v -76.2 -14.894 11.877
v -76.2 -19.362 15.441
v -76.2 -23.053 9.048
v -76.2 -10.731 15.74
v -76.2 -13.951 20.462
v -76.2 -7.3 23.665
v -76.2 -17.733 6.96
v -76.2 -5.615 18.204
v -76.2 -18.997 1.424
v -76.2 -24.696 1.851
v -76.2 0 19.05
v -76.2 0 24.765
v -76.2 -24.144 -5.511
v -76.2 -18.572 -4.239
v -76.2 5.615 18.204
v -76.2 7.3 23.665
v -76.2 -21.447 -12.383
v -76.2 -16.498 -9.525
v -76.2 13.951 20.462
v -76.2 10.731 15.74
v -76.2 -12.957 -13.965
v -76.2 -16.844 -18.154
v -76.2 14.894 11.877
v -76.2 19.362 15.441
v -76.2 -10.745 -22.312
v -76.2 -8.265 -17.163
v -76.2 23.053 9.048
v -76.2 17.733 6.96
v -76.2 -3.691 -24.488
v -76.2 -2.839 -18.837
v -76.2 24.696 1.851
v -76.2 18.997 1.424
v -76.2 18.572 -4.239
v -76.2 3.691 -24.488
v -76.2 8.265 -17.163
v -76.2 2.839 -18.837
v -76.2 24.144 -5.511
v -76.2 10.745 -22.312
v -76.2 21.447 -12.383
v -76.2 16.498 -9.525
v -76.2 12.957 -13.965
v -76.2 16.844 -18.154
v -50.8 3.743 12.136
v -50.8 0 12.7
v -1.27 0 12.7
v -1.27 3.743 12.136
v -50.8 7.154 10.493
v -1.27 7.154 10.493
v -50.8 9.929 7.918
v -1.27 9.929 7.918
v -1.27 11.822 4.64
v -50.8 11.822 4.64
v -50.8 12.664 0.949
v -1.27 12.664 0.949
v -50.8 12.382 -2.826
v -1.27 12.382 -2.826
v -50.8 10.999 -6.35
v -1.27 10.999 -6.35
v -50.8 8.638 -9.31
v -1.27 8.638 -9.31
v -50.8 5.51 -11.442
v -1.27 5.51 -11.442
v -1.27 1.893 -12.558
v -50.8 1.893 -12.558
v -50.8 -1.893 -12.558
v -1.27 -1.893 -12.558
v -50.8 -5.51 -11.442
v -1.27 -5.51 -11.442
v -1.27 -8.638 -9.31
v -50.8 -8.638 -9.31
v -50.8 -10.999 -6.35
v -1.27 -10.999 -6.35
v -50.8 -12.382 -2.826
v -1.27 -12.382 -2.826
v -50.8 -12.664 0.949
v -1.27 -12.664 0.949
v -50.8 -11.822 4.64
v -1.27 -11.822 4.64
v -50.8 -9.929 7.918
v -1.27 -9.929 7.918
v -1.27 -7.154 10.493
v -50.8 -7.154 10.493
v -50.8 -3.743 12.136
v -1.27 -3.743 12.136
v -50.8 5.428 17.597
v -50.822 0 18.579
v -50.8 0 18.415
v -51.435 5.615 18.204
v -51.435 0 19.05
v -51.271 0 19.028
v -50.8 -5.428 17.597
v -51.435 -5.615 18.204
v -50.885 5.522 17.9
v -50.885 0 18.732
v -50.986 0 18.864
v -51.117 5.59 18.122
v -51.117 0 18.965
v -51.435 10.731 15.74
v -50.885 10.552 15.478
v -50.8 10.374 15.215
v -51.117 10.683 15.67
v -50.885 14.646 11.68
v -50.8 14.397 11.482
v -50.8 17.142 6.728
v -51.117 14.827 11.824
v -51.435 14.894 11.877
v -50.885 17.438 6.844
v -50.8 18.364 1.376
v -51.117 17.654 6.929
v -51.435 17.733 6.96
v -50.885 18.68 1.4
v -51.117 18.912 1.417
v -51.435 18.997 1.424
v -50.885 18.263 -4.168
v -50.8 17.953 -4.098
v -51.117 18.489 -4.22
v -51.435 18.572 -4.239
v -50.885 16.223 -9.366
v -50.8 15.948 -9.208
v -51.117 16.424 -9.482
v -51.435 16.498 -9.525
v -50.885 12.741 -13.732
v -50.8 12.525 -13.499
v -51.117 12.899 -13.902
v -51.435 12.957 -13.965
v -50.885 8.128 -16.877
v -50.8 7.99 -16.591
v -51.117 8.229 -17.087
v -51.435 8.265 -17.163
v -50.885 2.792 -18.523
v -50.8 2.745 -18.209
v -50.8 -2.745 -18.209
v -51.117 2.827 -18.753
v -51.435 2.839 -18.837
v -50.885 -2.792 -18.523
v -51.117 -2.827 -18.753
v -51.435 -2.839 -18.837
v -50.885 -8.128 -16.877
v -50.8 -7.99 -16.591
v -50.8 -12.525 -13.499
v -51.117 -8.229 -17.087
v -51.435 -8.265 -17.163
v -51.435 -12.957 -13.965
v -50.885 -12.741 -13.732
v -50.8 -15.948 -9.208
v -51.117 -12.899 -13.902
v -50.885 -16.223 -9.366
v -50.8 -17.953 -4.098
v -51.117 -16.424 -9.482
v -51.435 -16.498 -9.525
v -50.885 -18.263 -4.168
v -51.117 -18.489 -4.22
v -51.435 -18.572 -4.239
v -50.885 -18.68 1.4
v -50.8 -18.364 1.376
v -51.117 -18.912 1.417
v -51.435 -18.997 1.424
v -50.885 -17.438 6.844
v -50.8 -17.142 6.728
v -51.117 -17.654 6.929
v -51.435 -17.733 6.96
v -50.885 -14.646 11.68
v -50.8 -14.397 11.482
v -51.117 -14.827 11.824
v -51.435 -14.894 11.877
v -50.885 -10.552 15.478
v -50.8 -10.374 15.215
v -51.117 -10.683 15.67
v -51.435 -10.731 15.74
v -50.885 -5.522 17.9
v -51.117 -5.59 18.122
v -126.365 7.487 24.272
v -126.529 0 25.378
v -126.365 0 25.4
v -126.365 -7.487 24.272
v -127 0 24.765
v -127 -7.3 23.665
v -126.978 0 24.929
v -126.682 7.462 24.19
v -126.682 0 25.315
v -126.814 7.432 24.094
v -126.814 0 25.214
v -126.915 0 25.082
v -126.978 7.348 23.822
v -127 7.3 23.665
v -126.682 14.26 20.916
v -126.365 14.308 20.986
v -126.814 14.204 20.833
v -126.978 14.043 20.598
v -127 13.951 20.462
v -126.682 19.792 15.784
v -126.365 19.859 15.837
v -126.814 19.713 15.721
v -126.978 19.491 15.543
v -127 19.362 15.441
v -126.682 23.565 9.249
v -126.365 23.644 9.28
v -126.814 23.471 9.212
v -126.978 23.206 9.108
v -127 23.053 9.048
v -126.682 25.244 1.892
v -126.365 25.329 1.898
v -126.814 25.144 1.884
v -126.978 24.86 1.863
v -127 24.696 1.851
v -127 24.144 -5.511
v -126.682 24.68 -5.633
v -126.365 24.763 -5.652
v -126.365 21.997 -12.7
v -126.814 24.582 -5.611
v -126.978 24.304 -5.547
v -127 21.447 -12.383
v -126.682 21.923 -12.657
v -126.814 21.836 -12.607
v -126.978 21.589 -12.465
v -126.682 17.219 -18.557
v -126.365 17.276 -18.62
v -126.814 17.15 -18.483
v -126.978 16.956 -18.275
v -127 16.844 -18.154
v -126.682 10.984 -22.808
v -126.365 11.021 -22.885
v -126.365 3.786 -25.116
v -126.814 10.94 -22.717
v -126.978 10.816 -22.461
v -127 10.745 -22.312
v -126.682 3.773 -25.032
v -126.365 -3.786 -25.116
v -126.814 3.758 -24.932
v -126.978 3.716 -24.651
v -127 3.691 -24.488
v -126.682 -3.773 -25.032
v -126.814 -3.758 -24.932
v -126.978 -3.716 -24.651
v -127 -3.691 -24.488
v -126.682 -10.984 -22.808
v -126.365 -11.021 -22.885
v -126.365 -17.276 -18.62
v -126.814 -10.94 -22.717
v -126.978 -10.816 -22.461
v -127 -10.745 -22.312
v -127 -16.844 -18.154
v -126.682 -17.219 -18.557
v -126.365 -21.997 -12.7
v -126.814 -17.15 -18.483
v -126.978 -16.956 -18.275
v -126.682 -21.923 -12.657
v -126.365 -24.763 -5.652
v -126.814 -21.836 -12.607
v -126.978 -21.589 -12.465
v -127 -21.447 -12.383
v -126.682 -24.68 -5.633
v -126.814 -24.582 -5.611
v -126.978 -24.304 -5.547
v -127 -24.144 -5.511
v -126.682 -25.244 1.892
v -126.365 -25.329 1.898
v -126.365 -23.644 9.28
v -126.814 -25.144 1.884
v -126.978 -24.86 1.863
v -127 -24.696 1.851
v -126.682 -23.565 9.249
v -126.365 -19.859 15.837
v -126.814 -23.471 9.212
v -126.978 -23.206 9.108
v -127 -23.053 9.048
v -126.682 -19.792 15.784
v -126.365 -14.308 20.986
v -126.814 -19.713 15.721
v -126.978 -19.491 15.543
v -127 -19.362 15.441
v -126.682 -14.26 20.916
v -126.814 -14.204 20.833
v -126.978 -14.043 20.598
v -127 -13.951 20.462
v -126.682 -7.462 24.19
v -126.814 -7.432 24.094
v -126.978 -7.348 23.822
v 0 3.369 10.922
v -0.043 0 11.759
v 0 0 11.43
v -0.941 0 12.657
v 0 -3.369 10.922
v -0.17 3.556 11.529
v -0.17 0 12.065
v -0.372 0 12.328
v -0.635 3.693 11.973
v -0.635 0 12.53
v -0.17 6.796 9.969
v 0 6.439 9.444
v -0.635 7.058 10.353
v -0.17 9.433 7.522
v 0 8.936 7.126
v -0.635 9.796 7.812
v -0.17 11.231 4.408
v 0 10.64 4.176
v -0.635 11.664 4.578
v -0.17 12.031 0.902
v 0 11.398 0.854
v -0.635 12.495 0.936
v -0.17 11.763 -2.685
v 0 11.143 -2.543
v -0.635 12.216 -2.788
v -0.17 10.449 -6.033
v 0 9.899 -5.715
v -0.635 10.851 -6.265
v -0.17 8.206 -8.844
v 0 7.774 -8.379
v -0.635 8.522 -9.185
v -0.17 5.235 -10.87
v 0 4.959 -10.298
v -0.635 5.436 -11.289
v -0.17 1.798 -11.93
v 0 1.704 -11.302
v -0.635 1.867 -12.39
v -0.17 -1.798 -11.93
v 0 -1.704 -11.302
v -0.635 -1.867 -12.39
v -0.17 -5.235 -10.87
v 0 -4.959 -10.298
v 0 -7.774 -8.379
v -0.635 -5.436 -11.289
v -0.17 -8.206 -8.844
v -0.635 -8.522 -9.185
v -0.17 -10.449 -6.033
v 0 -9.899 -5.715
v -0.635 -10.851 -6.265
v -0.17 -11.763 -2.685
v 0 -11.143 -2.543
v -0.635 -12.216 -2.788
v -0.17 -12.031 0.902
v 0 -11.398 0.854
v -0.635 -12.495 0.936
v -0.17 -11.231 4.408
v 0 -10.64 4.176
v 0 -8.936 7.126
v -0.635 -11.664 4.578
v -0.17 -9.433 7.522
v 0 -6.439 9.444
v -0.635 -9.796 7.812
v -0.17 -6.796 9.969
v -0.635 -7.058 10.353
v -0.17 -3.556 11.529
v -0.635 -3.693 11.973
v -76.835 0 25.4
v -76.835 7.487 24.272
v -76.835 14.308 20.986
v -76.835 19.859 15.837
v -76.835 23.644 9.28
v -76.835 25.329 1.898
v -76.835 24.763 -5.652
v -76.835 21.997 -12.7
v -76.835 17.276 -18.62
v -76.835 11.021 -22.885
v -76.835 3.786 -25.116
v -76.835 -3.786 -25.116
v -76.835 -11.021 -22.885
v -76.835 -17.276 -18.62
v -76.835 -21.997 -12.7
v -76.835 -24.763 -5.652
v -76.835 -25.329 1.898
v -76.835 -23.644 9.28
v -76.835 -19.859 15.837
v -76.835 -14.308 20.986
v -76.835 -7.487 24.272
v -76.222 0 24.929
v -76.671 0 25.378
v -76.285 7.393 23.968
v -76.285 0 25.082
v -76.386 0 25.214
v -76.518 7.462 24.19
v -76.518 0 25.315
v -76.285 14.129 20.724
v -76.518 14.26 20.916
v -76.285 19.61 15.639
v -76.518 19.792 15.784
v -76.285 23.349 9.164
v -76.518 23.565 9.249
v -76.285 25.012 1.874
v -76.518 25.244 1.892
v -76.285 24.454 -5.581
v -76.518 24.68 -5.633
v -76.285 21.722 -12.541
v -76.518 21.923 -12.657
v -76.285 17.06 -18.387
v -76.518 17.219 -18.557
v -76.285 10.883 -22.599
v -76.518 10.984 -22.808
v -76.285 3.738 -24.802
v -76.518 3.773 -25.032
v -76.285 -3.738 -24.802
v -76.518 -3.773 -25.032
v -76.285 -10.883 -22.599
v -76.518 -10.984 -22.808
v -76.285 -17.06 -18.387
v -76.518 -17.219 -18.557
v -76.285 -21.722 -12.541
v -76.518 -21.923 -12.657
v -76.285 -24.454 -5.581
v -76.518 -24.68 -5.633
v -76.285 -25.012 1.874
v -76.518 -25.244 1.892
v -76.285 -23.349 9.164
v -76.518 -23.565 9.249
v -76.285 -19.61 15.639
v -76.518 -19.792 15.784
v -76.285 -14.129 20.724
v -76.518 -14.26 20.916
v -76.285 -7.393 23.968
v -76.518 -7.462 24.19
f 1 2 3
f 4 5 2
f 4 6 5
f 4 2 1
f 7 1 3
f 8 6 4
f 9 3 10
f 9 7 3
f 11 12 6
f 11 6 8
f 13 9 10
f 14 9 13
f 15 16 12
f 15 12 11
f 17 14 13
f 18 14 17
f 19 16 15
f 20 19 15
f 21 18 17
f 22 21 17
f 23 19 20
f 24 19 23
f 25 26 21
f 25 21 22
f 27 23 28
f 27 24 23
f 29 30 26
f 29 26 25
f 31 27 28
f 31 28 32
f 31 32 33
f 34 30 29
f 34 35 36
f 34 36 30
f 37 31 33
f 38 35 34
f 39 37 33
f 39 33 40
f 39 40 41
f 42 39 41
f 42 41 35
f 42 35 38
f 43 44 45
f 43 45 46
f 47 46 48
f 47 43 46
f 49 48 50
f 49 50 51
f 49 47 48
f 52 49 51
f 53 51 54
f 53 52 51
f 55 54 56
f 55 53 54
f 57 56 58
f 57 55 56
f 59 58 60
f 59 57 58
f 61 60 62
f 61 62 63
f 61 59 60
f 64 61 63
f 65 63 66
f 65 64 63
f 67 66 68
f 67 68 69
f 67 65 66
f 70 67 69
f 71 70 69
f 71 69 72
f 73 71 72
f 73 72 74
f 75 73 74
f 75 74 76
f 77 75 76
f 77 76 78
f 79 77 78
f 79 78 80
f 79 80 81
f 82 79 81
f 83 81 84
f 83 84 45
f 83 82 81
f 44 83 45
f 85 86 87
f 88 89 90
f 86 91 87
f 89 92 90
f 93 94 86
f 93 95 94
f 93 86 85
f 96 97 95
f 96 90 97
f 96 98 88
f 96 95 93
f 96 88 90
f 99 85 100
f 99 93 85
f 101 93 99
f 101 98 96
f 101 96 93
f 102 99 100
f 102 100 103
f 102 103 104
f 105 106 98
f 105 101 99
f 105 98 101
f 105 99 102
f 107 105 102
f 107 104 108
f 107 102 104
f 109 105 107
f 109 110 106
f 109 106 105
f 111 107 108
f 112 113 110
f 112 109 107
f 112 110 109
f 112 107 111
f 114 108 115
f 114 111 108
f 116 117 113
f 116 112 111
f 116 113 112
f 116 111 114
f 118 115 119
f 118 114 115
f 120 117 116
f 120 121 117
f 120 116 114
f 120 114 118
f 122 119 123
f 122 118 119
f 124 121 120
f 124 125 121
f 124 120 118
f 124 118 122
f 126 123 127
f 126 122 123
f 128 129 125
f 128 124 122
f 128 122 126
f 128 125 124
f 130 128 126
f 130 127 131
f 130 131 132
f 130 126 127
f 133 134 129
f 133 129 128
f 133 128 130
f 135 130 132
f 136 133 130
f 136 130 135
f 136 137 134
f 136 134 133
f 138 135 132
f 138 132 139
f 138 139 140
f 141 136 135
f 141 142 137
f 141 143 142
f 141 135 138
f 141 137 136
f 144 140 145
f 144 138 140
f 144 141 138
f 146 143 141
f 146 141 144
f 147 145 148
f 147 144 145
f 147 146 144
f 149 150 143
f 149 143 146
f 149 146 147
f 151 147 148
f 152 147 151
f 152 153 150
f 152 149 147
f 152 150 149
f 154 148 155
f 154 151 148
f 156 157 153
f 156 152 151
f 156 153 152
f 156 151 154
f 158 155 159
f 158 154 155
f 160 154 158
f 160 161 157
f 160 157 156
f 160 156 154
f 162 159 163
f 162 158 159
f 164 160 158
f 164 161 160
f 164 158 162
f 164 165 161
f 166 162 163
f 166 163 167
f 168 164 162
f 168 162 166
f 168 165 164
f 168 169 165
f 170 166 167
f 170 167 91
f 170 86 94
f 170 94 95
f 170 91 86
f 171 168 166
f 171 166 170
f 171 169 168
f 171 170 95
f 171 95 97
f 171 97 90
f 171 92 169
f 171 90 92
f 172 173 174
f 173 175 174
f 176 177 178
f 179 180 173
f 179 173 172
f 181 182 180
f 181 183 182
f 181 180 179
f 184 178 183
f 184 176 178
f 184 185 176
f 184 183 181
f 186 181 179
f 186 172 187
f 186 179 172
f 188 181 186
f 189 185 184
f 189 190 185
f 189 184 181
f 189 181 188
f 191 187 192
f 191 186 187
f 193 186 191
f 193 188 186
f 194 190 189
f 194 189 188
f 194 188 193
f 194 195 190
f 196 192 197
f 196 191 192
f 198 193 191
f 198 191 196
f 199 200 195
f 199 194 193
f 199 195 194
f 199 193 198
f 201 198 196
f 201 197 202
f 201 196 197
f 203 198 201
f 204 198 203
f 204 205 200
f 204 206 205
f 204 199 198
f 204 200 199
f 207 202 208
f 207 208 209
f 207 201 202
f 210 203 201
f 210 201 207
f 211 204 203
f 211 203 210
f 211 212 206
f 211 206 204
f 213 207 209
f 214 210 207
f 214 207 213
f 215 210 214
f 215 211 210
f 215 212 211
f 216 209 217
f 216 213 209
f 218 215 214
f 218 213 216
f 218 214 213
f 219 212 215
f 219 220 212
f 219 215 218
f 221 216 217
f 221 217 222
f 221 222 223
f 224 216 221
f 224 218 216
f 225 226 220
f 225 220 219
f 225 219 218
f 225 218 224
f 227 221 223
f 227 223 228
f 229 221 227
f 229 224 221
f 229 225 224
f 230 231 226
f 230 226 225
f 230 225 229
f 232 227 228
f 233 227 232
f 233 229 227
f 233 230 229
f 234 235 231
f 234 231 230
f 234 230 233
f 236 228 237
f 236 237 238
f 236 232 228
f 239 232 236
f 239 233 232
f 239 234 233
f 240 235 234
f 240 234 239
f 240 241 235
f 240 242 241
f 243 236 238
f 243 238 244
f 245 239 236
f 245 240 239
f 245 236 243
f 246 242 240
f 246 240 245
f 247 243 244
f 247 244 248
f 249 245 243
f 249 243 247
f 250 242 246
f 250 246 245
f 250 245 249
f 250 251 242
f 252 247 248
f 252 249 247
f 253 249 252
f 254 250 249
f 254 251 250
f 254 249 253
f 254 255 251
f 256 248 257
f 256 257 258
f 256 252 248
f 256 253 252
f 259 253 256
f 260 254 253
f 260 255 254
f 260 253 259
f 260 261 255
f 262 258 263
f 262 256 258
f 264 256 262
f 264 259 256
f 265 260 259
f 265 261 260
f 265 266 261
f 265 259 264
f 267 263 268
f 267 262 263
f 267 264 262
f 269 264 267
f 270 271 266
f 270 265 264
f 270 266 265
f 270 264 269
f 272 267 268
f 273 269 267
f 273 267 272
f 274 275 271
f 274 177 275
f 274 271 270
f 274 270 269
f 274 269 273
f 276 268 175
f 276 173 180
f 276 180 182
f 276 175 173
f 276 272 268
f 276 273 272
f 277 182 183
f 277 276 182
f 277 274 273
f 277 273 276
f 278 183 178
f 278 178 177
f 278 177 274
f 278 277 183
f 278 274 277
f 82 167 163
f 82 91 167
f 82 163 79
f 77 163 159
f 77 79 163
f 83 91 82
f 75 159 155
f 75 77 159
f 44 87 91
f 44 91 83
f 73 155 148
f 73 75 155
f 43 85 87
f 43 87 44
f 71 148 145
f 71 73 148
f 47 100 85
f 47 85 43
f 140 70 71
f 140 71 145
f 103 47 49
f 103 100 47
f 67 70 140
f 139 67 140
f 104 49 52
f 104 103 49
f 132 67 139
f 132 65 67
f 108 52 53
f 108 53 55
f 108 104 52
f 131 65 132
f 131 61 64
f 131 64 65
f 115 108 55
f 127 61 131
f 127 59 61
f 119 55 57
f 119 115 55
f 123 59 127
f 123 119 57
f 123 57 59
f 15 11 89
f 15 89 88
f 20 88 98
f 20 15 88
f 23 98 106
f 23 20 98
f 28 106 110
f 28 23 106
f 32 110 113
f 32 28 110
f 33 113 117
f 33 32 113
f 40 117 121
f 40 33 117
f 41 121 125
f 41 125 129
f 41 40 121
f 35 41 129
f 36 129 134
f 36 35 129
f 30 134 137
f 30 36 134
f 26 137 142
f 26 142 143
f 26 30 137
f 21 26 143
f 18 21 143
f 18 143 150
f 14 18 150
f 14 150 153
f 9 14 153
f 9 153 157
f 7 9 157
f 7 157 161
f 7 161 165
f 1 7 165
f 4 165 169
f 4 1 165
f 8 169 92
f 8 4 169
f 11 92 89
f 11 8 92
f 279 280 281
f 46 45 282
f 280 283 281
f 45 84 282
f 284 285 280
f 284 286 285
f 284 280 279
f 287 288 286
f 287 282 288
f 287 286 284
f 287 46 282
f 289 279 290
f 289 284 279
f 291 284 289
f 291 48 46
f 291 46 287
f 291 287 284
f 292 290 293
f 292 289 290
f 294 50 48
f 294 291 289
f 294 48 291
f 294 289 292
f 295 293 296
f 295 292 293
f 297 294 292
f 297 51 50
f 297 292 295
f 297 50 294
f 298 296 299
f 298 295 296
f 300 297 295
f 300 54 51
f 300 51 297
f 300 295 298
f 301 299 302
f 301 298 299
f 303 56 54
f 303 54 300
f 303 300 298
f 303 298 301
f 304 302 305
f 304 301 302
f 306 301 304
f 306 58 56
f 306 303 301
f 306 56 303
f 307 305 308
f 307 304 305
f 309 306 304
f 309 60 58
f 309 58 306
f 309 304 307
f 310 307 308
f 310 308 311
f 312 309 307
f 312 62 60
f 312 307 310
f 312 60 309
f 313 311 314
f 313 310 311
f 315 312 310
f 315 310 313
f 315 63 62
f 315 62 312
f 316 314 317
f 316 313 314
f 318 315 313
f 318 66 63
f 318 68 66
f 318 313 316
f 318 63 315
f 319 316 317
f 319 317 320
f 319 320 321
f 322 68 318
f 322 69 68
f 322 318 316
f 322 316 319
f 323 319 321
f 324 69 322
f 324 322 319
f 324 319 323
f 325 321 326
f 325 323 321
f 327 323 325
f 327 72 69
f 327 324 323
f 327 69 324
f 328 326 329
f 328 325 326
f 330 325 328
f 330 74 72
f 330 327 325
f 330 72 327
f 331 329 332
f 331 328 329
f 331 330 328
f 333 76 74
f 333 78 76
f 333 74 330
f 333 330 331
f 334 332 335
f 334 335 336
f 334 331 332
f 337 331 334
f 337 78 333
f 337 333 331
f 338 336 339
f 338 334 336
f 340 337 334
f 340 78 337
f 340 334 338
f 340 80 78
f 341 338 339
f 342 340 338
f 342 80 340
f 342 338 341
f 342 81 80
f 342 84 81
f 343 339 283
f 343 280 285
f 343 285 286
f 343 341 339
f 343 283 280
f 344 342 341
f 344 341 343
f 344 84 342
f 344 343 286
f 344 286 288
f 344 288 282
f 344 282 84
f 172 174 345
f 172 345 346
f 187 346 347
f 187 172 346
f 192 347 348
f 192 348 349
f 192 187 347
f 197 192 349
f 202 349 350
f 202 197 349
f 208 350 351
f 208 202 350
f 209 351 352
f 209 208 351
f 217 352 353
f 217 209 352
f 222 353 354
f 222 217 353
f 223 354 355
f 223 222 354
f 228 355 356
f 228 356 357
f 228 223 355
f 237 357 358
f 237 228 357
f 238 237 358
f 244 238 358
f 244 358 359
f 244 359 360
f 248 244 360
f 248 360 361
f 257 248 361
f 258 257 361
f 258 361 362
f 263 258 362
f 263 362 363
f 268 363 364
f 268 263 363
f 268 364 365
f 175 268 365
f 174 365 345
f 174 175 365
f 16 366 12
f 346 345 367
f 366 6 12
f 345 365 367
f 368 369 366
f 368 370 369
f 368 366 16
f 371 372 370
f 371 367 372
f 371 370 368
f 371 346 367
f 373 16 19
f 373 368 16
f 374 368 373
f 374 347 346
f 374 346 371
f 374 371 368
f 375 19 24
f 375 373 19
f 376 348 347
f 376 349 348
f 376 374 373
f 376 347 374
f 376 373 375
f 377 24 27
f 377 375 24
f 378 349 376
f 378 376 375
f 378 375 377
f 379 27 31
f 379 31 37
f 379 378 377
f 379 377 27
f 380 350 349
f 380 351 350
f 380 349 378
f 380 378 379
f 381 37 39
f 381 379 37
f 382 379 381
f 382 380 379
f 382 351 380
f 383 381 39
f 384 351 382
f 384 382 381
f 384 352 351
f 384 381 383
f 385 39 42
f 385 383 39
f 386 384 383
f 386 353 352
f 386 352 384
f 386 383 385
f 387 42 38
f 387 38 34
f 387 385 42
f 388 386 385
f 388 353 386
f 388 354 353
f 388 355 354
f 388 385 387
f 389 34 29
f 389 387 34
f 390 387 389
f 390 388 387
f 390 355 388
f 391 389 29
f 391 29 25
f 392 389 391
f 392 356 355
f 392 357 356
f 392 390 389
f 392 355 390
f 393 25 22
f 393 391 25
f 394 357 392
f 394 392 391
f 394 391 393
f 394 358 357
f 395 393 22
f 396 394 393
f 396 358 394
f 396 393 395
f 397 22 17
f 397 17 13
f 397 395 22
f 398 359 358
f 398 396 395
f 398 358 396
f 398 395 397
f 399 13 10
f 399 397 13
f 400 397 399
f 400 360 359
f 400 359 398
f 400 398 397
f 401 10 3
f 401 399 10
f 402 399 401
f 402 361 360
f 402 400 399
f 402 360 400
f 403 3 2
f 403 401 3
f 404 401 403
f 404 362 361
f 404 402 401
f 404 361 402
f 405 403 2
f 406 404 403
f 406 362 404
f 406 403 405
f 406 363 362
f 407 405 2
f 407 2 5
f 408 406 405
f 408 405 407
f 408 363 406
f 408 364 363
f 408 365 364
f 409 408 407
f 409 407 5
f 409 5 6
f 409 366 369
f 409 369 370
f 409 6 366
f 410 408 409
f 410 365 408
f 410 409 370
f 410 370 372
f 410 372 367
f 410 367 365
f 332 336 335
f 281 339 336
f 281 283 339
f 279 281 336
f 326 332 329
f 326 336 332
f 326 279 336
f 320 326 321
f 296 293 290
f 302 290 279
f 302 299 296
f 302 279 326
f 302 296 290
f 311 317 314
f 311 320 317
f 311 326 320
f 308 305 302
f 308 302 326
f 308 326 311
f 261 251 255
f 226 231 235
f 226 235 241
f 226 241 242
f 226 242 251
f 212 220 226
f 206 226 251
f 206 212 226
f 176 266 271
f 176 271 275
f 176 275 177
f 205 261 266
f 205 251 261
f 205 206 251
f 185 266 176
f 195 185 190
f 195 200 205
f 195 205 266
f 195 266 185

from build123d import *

# Parameters (mm, degrees)
F2_R = 1.27
F3_R = 0.635


with BuildPart() as f1:
    # F0 (on Front) → F1 (revolve)
    with BuildSketch(Plane.XZ):
        Polygon((-127, 0), (0, 0), (0, 12.7), (-50.8, 12.7), (-50.8, 19.05), (-76.2, 19.05), (-76.2, 25.4), (-127, 25.4), align=None)
    revolve(axis=Axis((-63.5, 0, 0), (-1, 0, 0)))

    # F2
    f2_edges = [f1.edges().sort_by_distance(p)[0] for p in [
        (0, 0, -12.7),
    ]]
    fillet(f2_edges, radius=F2_R)

    # F3
    f3_edges = [f1.edges().sort_by_distance(p)[0] for p in [
        (-50.8, 0, -19.05),
        (-76.2, 0, -25.4),
        (-127, 0, -25.4),
    ]]
    fillet(f3_edges, radius=F3_R)


solid = f1.part
